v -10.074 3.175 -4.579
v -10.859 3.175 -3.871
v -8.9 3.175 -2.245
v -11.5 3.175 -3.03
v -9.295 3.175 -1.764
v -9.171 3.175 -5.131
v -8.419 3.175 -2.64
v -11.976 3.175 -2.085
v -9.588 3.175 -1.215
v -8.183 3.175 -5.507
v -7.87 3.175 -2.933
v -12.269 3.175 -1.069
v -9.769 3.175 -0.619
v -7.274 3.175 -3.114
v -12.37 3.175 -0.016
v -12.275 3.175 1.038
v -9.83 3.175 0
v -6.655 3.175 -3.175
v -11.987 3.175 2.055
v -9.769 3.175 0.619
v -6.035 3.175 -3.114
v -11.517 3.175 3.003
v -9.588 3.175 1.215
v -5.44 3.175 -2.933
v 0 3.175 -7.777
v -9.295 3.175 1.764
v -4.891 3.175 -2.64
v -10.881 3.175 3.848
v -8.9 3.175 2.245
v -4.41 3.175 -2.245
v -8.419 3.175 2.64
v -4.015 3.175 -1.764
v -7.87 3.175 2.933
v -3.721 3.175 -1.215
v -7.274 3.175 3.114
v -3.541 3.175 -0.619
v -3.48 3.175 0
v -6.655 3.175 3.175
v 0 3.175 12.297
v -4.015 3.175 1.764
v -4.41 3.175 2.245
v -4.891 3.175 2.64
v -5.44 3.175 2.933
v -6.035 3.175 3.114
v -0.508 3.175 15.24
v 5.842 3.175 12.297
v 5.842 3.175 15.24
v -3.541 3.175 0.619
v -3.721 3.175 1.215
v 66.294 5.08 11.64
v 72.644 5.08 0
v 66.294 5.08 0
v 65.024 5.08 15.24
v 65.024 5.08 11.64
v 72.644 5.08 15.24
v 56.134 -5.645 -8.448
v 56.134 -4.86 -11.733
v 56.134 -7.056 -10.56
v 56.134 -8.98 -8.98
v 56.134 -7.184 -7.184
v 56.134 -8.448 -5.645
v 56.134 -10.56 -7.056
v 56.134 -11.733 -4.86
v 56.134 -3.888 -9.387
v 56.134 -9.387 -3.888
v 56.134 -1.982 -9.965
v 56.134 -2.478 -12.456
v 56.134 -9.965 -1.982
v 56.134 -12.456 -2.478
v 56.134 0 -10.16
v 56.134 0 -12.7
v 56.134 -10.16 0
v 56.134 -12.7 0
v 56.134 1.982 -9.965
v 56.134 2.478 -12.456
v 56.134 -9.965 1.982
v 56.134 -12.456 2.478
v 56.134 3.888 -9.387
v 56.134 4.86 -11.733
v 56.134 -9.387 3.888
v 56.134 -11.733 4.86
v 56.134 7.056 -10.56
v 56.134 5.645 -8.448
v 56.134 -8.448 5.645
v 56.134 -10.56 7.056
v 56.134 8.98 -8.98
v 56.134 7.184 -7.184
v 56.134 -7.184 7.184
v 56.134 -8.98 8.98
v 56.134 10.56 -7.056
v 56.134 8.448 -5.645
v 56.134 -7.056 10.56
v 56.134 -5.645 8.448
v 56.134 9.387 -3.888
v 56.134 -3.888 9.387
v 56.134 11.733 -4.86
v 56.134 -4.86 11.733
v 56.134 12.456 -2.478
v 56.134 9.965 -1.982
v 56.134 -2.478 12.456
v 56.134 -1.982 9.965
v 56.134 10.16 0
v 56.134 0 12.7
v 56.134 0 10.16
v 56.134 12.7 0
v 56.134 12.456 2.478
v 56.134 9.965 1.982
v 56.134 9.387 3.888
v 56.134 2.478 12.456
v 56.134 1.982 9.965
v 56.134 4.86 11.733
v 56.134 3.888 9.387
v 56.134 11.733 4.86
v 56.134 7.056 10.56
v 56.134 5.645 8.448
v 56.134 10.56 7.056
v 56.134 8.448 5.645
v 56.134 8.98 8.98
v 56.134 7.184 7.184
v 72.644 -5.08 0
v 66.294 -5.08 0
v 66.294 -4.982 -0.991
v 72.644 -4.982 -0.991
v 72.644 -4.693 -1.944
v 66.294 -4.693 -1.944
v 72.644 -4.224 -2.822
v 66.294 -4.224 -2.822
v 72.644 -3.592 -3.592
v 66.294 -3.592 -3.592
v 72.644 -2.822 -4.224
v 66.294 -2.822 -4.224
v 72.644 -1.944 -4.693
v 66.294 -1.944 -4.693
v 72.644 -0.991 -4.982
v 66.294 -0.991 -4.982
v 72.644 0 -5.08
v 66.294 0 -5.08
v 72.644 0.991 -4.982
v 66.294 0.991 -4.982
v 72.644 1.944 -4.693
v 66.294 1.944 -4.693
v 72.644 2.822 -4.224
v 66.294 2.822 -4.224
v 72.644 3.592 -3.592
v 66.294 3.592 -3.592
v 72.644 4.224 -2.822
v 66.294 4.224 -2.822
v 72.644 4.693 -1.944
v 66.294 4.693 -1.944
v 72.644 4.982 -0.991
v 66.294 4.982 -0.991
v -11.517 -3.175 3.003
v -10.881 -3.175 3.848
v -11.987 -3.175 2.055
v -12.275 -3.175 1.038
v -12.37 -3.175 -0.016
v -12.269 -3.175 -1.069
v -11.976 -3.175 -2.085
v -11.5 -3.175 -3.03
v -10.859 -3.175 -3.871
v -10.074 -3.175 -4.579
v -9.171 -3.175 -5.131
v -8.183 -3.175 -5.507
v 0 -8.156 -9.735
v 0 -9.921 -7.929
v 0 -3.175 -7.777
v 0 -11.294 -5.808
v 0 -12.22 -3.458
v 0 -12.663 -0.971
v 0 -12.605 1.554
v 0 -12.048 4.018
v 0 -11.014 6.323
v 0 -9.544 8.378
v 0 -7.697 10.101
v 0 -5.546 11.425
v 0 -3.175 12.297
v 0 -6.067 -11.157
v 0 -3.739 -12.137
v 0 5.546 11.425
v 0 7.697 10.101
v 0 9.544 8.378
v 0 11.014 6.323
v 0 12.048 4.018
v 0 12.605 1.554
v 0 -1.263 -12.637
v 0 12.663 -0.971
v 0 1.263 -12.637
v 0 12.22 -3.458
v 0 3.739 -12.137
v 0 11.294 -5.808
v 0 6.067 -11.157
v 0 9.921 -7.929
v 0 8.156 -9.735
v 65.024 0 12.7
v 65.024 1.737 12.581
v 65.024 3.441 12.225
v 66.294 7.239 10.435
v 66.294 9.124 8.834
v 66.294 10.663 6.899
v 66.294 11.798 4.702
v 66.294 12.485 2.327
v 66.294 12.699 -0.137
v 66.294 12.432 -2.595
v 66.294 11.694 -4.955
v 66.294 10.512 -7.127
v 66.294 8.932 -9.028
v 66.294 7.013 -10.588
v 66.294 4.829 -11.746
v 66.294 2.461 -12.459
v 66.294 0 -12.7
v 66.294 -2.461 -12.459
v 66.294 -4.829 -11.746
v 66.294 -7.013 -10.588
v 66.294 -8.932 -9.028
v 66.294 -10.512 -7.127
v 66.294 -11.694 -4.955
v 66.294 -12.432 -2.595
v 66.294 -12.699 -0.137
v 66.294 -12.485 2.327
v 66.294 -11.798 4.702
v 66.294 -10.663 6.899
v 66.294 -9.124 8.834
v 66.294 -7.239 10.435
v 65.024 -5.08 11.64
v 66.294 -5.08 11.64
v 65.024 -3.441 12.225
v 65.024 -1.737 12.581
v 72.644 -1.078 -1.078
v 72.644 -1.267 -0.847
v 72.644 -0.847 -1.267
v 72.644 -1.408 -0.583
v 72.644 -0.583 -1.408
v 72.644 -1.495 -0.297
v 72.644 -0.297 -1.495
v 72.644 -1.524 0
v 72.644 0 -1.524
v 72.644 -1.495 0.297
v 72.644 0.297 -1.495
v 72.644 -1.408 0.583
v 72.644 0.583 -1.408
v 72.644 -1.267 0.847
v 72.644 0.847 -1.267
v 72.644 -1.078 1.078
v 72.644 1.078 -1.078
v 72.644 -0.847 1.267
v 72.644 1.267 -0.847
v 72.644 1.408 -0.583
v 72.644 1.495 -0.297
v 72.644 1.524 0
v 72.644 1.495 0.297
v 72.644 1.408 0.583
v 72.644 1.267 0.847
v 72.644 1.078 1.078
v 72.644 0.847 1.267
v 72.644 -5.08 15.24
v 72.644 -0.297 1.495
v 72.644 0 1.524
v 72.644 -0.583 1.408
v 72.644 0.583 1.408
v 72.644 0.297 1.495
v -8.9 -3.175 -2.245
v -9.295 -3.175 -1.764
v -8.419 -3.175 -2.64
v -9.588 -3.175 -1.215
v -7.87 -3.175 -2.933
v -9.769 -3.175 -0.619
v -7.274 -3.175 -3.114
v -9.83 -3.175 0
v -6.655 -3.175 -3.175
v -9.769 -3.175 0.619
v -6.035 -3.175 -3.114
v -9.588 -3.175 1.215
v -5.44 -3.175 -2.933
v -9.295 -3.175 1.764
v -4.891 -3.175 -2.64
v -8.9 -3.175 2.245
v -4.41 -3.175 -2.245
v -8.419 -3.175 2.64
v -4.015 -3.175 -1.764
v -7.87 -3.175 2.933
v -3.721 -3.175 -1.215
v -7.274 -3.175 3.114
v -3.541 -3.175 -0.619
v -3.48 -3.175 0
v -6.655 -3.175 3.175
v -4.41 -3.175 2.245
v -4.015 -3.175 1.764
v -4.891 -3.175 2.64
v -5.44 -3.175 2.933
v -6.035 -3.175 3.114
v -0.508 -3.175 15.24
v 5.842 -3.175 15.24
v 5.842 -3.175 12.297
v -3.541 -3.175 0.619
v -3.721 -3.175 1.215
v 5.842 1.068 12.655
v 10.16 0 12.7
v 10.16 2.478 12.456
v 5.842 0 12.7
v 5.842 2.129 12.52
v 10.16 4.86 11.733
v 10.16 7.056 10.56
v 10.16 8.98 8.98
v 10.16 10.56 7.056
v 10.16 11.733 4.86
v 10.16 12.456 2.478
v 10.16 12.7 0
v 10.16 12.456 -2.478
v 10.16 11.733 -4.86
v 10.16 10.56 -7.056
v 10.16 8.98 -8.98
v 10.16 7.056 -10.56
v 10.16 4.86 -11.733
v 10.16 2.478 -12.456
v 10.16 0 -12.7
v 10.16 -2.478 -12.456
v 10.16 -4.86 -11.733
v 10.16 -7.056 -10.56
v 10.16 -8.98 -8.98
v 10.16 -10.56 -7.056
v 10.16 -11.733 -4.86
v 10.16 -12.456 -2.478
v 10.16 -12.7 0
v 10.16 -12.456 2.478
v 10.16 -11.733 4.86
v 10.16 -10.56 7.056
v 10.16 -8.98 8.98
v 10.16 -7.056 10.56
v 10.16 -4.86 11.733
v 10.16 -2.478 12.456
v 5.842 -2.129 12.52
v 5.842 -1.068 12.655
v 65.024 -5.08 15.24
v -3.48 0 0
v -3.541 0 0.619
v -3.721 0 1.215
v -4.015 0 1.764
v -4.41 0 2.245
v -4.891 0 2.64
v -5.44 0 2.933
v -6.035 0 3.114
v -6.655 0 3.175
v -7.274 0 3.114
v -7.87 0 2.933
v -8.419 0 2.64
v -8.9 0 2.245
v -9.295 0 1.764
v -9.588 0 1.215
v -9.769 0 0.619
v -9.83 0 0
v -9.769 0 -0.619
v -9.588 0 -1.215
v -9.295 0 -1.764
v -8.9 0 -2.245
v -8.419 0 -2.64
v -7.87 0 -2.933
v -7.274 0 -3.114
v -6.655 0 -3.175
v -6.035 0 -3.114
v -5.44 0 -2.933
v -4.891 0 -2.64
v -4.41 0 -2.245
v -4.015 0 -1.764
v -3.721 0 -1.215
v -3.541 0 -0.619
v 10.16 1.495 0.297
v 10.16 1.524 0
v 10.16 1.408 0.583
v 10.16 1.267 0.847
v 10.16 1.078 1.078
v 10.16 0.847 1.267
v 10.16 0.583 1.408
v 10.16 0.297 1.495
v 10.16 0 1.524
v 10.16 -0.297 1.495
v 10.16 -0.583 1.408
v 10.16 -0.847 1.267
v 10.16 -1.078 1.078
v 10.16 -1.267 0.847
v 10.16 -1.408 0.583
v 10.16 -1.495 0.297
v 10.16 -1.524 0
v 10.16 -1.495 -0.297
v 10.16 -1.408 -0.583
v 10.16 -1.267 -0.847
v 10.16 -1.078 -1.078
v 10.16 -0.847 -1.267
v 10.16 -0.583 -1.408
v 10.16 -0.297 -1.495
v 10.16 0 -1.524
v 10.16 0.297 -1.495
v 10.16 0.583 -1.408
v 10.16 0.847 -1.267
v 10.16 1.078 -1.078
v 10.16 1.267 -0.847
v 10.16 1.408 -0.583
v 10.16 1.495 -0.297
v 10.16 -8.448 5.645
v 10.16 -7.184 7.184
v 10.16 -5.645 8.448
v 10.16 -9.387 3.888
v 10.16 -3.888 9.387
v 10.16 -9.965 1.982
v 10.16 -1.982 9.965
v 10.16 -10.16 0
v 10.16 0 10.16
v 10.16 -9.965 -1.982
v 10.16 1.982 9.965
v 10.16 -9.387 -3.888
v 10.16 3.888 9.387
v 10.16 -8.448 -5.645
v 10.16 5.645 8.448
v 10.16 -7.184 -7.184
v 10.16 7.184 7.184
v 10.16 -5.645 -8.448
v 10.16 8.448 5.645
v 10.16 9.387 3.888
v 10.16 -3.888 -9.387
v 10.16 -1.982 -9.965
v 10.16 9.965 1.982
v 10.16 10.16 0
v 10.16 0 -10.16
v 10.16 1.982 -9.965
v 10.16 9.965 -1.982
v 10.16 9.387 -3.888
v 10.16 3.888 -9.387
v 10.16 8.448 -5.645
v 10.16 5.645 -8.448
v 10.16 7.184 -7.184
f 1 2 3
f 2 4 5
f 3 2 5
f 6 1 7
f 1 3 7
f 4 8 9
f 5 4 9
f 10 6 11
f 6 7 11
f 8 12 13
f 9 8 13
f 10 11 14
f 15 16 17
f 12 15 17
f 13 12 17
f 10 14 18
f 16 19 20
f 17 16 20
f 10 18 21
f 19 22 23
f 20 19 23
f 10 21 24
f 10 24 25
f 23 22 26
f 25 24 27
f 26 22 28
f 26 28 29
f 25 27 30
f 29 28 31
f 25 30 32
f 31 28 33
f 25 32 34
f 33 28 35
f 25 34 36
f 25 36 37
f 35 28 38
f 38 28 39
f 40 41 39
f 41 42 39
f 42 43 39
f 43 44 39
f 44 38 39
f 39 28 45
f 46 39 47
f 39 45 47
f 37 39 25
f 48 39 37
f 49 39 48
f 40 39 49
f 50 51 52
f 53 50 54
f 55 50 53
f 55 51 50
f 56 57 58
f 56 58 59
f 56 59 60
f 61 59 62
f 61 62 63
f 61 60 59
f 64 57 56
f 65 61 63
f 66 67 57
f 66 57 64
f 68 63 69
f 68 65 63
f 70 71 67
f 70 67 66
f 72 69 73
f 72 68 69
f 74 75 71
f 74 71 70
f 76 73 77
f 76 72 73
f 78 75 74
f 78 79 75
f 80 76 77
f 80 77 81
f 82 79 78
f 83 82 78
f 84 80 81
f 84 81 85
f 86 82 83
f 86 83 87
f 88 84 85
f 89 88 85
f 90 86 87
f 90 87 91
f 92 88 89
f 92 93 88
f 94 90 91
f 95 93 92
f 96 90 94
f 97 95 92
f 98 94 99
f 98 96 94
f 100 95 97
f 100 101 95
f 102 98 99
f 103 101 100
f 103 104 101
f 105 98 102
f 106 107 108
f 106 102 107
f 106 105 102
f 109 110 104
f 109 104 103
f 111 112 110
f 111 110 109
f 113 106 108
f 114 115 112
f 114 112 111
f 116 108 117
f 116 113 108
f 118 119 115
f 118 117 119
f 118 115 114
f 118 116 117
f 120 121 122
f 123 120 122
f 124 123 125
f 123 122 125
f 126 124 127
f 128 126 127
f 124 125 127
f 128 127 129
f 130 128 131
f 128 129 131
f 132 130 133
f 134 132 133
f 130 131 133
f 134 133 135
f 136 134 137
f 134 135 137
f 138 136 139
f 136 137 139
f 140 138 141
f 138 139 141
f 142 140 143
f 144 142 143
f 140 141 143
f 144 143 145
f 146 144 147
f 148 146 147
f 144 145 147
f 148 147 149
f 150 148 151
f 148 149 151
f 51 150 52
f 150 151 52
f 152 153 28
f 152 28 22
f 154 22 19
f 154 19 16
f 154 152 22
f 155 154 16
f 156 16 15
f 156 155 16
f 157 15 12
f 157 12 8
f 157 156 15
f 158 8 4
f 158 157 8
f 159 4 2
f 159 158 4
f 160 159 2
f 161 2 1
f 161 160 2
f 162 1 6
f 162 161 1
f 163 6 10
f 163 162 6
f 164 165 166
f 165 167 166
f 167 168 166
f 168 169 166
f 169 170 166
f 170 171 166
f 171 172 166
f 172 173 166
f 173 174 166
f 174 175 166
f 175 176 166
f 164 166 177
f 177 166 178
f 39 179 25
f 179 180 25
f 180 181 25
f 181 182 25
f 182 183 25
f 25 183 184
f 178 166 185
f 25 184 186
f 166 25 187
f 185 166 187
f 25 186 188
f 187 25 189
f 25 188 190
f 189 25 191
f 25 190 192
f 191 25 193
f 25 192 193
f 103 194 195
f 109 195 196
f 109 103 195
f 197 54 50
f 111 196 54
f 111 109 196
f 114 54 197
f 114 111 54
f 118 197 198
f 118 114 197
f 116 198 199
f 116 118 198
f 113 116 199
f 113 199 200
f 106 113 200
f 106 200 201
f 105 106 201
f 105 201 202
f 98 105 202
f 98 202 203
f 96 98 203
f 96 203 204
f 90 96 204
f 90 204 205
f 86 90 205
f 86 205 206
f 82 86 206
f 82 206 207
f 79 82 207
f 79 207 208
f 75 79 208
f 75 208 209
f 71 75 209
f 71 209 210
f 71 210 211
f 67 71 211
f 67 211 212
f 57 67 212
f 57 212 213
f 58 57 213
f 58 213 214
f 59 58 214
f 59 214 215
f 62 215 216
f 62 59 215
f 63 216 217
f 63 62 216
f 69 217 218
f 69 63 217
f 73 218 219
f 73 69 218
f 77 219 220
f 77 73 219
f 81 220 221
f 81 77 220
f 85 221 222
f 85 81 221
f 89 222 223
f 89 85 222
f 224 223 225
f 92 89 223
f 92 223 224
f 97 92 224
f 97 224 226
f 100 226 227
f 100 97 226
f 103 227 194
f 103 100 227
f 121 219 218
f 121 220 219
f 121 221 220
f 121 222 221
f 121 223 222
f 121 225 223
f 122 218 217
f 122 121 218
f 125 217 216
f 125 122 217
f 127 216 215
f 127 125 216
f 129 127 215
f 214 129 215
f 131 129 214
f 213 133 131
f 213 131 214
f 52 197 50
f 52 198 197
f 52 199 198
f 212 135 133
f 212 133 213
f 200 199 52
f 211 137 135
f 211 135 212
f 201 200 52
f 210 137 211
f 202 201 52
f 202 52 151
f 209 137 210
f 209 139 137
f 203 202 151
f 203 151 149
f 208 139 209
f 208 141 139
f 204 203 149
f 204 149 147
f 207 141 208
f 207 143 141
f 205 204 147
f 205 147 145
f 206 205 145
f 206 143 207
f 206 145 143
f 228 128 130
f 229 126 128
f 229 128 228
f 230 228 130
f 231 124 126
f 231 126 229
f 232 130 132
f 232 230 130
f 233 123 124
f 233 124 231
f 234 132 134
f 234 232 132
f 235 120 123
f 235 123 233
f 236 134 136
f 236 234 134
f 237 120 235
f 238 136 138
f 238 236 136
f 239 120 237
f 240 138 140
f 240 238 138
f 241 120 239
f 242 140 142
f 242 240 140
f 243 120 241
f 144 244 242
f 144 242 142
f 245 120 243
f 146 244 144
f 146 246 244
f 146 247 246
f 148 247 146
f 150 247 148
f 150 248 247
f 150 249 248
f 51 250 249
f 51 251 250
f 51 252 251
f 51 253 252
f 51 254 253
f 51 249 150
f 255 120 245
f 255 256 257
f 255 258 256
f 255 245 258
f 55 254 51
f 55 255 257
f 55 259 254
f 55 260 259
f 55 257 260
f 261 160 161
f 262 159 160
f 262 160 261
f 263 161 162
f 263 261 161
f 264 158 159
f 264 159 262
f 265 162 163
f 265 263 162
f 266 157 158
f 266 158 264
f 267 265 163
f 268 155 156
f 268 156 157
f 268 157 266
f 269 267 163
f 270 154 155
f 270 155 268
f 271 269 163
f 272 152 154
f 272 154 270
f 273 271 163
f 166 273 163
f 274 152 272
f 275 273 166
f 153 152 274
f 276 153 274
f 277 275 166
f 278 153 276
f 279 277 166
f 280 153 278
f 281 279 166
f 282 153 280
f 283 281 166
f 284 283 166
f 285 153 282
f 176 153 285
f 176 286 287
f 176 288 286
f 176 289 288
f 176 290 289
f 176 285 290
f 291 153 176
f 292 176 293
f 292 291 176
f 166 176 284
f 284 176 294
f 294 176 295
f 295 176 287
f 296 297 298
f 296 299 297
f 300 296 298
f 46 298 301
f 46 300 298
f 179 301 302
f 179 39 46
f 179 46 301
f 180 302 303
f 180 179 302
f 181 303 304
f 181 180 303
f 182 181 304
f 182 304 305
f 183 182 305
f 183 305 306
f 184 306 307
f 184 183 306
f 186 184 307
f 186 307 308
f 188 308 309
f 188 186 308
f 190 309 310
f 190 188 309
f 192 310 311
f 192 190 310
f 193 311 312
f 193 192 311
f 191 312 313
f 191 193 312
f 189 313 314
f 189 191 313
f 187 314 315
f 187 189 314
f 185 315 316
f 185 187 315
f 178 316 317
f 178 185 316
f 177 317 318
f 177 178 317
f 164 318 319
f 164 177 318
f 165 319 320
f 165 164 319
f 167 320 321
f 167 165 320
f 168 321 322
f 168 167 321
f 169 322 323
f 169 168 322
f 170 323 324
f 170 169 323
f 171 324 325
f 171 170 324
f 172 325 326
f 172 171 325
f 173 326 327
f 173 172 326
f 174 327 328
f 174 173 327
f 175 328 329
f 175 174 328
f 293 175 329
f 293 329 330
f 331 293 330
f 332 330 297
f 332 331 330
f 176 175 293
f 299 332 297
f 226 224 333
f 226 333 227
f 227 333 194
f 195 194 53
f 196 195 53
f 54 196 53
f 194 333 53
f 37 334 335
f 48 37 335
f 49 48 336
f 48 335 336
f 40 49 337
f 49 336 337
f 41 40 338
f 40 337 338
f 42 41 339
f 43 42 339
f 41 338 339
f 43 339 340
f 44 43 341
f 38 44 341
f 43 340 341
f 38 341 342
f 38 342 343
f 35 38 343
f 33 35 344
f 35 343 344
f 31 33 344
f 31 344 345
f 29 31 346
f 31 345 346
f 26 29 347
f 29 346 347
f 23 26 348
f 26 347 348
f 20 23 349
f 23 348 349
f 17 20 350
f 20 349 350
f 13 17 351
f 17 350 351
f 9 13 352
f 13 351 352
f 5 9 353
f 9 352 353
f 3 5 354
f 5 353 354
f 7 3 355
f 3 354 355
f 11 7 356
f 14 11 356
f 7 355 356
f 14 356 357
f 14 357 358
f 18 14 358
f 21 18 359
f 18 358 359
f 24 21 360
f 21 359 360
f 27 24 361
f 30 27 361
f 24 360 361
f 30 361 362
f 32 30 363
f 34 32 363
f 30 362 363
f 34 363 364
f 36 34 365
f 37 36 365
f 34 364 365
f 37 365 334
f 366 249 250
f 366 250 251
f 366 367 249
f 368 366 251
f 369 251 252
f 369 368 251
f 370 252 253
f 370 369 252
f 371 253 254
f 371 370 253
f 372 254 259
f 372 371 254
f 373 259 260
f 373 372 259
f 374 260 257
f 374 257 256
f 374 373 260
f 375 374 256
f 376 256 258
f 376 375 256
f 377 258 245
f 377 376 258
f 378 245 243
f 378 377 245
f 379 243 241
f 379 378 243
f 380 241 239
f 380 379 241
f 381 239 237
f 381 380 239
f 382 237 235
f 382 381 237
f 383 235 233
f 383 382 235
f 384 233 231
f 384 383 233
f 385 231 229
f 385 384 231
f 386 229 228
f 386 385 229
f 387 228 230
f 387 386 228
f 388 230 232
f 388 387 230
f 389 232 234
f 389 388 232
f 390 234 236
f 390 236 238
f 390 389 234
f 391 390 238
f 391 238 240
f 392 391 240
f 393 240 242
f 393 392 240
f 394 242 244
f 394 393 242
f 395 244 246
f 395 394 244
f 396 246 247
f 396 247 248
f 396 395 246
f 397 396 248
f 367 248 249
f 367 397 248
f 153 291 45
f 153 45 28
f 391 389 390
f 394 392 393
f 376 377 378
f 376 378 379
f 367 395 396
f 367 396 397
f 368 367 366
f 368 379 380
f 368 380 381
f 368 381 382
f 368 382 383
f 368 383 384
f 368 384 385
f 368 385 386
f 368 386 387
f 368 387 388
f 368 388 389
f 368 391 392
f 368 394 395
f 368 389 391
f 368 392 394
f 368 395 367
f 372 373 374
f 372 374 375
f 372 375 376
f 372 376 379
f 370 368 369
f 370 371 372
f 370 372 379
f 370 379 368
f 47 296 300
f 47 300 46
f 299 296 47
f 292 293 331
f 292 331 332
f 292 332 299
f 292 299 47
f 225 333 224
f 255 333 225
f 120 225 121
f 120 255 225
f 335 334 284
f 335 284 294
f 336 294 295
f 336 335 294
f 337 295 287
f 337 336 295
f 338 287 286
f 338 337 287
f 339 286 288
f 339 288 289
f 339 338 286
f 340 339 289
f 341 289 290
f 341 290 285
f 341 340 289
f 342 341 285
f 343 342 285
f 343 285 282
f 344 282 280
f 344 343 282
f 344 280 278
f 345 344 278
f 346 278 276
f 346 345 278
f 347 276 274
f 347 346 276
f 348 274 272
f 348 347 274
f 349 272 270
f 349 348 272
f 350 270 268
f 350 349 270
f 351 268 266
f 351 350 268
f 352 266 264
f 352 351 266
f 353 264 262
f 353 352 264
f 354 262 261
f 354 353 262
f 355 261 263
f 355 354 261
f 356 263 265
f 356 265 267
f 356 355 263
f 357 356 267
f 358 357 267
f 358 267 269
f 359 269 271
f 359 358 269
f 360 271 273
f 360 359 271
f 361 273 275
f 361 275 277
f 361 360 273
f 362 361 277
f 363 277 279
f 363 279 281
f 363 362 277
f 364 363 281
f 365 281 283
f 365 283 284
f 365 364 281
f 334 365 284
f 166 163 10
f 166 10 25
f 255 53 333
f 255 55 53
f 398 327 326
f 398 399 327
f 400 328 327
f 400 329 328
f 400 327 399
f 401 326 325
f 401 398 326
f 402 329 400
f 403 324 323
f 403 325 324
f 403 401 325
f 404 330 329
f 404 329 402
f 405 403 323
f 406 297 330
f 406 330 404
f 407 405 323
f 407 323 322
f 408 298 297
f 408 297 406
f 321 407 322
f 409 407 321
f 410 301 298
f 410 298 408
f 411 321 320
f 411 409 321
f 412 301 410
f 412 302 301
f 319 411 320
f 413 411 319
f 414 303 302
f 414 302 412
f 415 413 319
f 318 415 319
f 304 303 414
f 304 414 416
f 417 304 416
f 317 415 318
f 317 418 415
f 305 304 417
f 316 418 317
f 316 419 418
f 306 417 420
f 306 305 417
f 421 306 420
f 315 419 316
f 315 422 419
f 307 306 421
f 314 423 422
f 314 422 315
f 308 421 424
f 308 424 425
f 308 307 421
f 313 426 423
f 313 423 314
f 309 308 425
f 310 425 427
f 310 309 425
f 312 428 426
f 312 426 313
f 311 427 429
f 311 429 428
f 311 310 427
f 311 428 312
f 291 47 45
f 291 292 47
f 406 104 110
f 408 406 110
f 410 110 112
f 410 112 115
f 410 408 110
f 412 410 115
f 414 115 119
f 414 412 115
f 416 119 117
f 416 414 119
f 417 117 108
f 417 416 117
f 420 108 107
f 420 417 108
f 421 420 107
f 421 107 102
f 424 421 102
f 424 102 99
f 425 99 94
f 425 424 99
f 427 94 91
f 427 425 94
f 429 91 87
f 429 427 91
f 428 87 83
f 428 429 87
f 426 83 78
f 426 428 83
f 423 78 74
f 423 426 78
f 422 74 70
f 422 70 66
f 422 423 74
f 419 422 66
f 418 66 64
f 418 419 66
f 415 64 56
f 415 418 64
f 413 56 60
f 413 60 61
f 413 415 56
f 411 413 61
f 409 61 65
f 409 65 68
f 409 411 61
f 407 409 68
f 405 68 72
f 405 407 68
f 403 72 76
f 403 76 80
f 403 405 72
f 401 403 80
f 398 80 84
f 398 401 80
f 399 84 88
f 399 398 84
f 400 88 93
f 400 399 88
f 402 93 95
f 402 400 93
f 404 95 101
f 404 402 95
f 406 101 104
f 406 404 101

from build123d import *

# Parameters (mm, degrees)
F0_W          = 5.842
F0_H          = 12.7
F2_R          = 1.524
F3_DEPTH      = 6.35
F3_DEPTH_BACK = 1.27
F4_DEPTH      = 56.134
F0_R          = 3.175
F5_DEPTH      = 3.175
F5_DEPTH_BACK = 3.175


with BuildPart() as f1:
    # F0 (on Front) → F1 (revolve)
    with BuildSketch(Plane.XZ):
        Polygon((5.842, 12.7), (5.842, 0), (66.294, 0), (66.294, 12.7), (56.134, 12.7), (56.134, 10.16), (10.16, 10.16), (10.16, 12.7), align=None)
        with Locations((2.921, 6.35)):
            Rectangle(F0_W, F0_H)
    revolve(axis=Axis((33.147, 0, 0), (-1, 0, 0)))

    # F2 (on face) → F3 (join, two sides)
    with BuildSketch(Plane.YZ.offset(66.294)) as f3_sk:
        with BuildLine():
            ThreePointArc((-5.08, 0), (0, -5.08), (5.08, 0))
            ThreePointArc((5.08, 0), (0, 5.08), (-5.08, 0))
        make_face()
        Circle(F2_R, mode=Mode.SUBTRACT)
        with BuildLine():
            ThreePointArc((-5.08, 0), (0, 5.08), (5.08, 0))
            Line((5.08, 0), (5.08, 15.24))
            Line((5.08, 15.24), (-5.08, 15.24))
            Line((-5.08, 15.24), (-5.08, 0))
        make_face()
    extrude(amount=F3_DEPTH)
    extrude(f3_sk.sketch, amount=-F3_DEPTH_BACK)

    # F2 (on face) → F4 (cut, through all)
    with BuildSketch(Plane.YZ.offset(66.294)):
        Circle(F2_R)
    extrude(amount=-F4_DEPTH, mode=Mode.SUBTRACT)

    # F0 (on Front) → F5 (join, two sides)
    with BuildSketch(Plane.XZ) as f5_sk:
        with BuildLine():
            Line((-0.9398, 0), (0, 0))
            Line((0, 0), (0, 12.7))
            Line((0, 12.7), (5.842, 12.7))
            Line((5.842, 12.7), (5.842, 15.24))
            Line((5.842, 15.24), (-0.508, 15.24))
            Line((-0.508, 15.24), (-10.88063, 3.847543))
            ThreePointArc((-10.88063, 3.847543), (-4.591961, 5.329721), (-0.9398, 0))
        make_face()
        with BuildLine():
            ThreePointArc((-8.182663, -5.506983), (-3.195791, -4.549339), (-0.9398, 0))
            ThreePointArc((-0.9398, 0), (-4.591961, 5.329721), (-10.88063, 3.847543))
            ThreePointArc((-10.88063, 3.847543), (-12.145978, -1.583727), (-8.182663, -5.506983))
        make_face()
        with Locations((-6.6548, 0)):
            Circle(F0_R, mode=Mode.SUBTRACT)
        with BuildLine():
            Line((5.842, 0), (0, 0))
            Line((0, 0), (-0.9398, 0))
            ThreePointArc((-0.9398, 0), (-3.195791, -4.549339), (-8.182663, -5.506983))
            Line((-8.182663, -5.506983), (5.842, -9.398))
            Line((5.842, -9.398), (5.842, 0))
        make_face()
        with Locations((2.921, 6.35)):
            Rectangle(F0_W, F0_H)
    extrude(amount=F5_DEPTH)
    extrude(f5_sk.sketch, amount=-F5_DEPTH_BACK)


solid = f1.part
